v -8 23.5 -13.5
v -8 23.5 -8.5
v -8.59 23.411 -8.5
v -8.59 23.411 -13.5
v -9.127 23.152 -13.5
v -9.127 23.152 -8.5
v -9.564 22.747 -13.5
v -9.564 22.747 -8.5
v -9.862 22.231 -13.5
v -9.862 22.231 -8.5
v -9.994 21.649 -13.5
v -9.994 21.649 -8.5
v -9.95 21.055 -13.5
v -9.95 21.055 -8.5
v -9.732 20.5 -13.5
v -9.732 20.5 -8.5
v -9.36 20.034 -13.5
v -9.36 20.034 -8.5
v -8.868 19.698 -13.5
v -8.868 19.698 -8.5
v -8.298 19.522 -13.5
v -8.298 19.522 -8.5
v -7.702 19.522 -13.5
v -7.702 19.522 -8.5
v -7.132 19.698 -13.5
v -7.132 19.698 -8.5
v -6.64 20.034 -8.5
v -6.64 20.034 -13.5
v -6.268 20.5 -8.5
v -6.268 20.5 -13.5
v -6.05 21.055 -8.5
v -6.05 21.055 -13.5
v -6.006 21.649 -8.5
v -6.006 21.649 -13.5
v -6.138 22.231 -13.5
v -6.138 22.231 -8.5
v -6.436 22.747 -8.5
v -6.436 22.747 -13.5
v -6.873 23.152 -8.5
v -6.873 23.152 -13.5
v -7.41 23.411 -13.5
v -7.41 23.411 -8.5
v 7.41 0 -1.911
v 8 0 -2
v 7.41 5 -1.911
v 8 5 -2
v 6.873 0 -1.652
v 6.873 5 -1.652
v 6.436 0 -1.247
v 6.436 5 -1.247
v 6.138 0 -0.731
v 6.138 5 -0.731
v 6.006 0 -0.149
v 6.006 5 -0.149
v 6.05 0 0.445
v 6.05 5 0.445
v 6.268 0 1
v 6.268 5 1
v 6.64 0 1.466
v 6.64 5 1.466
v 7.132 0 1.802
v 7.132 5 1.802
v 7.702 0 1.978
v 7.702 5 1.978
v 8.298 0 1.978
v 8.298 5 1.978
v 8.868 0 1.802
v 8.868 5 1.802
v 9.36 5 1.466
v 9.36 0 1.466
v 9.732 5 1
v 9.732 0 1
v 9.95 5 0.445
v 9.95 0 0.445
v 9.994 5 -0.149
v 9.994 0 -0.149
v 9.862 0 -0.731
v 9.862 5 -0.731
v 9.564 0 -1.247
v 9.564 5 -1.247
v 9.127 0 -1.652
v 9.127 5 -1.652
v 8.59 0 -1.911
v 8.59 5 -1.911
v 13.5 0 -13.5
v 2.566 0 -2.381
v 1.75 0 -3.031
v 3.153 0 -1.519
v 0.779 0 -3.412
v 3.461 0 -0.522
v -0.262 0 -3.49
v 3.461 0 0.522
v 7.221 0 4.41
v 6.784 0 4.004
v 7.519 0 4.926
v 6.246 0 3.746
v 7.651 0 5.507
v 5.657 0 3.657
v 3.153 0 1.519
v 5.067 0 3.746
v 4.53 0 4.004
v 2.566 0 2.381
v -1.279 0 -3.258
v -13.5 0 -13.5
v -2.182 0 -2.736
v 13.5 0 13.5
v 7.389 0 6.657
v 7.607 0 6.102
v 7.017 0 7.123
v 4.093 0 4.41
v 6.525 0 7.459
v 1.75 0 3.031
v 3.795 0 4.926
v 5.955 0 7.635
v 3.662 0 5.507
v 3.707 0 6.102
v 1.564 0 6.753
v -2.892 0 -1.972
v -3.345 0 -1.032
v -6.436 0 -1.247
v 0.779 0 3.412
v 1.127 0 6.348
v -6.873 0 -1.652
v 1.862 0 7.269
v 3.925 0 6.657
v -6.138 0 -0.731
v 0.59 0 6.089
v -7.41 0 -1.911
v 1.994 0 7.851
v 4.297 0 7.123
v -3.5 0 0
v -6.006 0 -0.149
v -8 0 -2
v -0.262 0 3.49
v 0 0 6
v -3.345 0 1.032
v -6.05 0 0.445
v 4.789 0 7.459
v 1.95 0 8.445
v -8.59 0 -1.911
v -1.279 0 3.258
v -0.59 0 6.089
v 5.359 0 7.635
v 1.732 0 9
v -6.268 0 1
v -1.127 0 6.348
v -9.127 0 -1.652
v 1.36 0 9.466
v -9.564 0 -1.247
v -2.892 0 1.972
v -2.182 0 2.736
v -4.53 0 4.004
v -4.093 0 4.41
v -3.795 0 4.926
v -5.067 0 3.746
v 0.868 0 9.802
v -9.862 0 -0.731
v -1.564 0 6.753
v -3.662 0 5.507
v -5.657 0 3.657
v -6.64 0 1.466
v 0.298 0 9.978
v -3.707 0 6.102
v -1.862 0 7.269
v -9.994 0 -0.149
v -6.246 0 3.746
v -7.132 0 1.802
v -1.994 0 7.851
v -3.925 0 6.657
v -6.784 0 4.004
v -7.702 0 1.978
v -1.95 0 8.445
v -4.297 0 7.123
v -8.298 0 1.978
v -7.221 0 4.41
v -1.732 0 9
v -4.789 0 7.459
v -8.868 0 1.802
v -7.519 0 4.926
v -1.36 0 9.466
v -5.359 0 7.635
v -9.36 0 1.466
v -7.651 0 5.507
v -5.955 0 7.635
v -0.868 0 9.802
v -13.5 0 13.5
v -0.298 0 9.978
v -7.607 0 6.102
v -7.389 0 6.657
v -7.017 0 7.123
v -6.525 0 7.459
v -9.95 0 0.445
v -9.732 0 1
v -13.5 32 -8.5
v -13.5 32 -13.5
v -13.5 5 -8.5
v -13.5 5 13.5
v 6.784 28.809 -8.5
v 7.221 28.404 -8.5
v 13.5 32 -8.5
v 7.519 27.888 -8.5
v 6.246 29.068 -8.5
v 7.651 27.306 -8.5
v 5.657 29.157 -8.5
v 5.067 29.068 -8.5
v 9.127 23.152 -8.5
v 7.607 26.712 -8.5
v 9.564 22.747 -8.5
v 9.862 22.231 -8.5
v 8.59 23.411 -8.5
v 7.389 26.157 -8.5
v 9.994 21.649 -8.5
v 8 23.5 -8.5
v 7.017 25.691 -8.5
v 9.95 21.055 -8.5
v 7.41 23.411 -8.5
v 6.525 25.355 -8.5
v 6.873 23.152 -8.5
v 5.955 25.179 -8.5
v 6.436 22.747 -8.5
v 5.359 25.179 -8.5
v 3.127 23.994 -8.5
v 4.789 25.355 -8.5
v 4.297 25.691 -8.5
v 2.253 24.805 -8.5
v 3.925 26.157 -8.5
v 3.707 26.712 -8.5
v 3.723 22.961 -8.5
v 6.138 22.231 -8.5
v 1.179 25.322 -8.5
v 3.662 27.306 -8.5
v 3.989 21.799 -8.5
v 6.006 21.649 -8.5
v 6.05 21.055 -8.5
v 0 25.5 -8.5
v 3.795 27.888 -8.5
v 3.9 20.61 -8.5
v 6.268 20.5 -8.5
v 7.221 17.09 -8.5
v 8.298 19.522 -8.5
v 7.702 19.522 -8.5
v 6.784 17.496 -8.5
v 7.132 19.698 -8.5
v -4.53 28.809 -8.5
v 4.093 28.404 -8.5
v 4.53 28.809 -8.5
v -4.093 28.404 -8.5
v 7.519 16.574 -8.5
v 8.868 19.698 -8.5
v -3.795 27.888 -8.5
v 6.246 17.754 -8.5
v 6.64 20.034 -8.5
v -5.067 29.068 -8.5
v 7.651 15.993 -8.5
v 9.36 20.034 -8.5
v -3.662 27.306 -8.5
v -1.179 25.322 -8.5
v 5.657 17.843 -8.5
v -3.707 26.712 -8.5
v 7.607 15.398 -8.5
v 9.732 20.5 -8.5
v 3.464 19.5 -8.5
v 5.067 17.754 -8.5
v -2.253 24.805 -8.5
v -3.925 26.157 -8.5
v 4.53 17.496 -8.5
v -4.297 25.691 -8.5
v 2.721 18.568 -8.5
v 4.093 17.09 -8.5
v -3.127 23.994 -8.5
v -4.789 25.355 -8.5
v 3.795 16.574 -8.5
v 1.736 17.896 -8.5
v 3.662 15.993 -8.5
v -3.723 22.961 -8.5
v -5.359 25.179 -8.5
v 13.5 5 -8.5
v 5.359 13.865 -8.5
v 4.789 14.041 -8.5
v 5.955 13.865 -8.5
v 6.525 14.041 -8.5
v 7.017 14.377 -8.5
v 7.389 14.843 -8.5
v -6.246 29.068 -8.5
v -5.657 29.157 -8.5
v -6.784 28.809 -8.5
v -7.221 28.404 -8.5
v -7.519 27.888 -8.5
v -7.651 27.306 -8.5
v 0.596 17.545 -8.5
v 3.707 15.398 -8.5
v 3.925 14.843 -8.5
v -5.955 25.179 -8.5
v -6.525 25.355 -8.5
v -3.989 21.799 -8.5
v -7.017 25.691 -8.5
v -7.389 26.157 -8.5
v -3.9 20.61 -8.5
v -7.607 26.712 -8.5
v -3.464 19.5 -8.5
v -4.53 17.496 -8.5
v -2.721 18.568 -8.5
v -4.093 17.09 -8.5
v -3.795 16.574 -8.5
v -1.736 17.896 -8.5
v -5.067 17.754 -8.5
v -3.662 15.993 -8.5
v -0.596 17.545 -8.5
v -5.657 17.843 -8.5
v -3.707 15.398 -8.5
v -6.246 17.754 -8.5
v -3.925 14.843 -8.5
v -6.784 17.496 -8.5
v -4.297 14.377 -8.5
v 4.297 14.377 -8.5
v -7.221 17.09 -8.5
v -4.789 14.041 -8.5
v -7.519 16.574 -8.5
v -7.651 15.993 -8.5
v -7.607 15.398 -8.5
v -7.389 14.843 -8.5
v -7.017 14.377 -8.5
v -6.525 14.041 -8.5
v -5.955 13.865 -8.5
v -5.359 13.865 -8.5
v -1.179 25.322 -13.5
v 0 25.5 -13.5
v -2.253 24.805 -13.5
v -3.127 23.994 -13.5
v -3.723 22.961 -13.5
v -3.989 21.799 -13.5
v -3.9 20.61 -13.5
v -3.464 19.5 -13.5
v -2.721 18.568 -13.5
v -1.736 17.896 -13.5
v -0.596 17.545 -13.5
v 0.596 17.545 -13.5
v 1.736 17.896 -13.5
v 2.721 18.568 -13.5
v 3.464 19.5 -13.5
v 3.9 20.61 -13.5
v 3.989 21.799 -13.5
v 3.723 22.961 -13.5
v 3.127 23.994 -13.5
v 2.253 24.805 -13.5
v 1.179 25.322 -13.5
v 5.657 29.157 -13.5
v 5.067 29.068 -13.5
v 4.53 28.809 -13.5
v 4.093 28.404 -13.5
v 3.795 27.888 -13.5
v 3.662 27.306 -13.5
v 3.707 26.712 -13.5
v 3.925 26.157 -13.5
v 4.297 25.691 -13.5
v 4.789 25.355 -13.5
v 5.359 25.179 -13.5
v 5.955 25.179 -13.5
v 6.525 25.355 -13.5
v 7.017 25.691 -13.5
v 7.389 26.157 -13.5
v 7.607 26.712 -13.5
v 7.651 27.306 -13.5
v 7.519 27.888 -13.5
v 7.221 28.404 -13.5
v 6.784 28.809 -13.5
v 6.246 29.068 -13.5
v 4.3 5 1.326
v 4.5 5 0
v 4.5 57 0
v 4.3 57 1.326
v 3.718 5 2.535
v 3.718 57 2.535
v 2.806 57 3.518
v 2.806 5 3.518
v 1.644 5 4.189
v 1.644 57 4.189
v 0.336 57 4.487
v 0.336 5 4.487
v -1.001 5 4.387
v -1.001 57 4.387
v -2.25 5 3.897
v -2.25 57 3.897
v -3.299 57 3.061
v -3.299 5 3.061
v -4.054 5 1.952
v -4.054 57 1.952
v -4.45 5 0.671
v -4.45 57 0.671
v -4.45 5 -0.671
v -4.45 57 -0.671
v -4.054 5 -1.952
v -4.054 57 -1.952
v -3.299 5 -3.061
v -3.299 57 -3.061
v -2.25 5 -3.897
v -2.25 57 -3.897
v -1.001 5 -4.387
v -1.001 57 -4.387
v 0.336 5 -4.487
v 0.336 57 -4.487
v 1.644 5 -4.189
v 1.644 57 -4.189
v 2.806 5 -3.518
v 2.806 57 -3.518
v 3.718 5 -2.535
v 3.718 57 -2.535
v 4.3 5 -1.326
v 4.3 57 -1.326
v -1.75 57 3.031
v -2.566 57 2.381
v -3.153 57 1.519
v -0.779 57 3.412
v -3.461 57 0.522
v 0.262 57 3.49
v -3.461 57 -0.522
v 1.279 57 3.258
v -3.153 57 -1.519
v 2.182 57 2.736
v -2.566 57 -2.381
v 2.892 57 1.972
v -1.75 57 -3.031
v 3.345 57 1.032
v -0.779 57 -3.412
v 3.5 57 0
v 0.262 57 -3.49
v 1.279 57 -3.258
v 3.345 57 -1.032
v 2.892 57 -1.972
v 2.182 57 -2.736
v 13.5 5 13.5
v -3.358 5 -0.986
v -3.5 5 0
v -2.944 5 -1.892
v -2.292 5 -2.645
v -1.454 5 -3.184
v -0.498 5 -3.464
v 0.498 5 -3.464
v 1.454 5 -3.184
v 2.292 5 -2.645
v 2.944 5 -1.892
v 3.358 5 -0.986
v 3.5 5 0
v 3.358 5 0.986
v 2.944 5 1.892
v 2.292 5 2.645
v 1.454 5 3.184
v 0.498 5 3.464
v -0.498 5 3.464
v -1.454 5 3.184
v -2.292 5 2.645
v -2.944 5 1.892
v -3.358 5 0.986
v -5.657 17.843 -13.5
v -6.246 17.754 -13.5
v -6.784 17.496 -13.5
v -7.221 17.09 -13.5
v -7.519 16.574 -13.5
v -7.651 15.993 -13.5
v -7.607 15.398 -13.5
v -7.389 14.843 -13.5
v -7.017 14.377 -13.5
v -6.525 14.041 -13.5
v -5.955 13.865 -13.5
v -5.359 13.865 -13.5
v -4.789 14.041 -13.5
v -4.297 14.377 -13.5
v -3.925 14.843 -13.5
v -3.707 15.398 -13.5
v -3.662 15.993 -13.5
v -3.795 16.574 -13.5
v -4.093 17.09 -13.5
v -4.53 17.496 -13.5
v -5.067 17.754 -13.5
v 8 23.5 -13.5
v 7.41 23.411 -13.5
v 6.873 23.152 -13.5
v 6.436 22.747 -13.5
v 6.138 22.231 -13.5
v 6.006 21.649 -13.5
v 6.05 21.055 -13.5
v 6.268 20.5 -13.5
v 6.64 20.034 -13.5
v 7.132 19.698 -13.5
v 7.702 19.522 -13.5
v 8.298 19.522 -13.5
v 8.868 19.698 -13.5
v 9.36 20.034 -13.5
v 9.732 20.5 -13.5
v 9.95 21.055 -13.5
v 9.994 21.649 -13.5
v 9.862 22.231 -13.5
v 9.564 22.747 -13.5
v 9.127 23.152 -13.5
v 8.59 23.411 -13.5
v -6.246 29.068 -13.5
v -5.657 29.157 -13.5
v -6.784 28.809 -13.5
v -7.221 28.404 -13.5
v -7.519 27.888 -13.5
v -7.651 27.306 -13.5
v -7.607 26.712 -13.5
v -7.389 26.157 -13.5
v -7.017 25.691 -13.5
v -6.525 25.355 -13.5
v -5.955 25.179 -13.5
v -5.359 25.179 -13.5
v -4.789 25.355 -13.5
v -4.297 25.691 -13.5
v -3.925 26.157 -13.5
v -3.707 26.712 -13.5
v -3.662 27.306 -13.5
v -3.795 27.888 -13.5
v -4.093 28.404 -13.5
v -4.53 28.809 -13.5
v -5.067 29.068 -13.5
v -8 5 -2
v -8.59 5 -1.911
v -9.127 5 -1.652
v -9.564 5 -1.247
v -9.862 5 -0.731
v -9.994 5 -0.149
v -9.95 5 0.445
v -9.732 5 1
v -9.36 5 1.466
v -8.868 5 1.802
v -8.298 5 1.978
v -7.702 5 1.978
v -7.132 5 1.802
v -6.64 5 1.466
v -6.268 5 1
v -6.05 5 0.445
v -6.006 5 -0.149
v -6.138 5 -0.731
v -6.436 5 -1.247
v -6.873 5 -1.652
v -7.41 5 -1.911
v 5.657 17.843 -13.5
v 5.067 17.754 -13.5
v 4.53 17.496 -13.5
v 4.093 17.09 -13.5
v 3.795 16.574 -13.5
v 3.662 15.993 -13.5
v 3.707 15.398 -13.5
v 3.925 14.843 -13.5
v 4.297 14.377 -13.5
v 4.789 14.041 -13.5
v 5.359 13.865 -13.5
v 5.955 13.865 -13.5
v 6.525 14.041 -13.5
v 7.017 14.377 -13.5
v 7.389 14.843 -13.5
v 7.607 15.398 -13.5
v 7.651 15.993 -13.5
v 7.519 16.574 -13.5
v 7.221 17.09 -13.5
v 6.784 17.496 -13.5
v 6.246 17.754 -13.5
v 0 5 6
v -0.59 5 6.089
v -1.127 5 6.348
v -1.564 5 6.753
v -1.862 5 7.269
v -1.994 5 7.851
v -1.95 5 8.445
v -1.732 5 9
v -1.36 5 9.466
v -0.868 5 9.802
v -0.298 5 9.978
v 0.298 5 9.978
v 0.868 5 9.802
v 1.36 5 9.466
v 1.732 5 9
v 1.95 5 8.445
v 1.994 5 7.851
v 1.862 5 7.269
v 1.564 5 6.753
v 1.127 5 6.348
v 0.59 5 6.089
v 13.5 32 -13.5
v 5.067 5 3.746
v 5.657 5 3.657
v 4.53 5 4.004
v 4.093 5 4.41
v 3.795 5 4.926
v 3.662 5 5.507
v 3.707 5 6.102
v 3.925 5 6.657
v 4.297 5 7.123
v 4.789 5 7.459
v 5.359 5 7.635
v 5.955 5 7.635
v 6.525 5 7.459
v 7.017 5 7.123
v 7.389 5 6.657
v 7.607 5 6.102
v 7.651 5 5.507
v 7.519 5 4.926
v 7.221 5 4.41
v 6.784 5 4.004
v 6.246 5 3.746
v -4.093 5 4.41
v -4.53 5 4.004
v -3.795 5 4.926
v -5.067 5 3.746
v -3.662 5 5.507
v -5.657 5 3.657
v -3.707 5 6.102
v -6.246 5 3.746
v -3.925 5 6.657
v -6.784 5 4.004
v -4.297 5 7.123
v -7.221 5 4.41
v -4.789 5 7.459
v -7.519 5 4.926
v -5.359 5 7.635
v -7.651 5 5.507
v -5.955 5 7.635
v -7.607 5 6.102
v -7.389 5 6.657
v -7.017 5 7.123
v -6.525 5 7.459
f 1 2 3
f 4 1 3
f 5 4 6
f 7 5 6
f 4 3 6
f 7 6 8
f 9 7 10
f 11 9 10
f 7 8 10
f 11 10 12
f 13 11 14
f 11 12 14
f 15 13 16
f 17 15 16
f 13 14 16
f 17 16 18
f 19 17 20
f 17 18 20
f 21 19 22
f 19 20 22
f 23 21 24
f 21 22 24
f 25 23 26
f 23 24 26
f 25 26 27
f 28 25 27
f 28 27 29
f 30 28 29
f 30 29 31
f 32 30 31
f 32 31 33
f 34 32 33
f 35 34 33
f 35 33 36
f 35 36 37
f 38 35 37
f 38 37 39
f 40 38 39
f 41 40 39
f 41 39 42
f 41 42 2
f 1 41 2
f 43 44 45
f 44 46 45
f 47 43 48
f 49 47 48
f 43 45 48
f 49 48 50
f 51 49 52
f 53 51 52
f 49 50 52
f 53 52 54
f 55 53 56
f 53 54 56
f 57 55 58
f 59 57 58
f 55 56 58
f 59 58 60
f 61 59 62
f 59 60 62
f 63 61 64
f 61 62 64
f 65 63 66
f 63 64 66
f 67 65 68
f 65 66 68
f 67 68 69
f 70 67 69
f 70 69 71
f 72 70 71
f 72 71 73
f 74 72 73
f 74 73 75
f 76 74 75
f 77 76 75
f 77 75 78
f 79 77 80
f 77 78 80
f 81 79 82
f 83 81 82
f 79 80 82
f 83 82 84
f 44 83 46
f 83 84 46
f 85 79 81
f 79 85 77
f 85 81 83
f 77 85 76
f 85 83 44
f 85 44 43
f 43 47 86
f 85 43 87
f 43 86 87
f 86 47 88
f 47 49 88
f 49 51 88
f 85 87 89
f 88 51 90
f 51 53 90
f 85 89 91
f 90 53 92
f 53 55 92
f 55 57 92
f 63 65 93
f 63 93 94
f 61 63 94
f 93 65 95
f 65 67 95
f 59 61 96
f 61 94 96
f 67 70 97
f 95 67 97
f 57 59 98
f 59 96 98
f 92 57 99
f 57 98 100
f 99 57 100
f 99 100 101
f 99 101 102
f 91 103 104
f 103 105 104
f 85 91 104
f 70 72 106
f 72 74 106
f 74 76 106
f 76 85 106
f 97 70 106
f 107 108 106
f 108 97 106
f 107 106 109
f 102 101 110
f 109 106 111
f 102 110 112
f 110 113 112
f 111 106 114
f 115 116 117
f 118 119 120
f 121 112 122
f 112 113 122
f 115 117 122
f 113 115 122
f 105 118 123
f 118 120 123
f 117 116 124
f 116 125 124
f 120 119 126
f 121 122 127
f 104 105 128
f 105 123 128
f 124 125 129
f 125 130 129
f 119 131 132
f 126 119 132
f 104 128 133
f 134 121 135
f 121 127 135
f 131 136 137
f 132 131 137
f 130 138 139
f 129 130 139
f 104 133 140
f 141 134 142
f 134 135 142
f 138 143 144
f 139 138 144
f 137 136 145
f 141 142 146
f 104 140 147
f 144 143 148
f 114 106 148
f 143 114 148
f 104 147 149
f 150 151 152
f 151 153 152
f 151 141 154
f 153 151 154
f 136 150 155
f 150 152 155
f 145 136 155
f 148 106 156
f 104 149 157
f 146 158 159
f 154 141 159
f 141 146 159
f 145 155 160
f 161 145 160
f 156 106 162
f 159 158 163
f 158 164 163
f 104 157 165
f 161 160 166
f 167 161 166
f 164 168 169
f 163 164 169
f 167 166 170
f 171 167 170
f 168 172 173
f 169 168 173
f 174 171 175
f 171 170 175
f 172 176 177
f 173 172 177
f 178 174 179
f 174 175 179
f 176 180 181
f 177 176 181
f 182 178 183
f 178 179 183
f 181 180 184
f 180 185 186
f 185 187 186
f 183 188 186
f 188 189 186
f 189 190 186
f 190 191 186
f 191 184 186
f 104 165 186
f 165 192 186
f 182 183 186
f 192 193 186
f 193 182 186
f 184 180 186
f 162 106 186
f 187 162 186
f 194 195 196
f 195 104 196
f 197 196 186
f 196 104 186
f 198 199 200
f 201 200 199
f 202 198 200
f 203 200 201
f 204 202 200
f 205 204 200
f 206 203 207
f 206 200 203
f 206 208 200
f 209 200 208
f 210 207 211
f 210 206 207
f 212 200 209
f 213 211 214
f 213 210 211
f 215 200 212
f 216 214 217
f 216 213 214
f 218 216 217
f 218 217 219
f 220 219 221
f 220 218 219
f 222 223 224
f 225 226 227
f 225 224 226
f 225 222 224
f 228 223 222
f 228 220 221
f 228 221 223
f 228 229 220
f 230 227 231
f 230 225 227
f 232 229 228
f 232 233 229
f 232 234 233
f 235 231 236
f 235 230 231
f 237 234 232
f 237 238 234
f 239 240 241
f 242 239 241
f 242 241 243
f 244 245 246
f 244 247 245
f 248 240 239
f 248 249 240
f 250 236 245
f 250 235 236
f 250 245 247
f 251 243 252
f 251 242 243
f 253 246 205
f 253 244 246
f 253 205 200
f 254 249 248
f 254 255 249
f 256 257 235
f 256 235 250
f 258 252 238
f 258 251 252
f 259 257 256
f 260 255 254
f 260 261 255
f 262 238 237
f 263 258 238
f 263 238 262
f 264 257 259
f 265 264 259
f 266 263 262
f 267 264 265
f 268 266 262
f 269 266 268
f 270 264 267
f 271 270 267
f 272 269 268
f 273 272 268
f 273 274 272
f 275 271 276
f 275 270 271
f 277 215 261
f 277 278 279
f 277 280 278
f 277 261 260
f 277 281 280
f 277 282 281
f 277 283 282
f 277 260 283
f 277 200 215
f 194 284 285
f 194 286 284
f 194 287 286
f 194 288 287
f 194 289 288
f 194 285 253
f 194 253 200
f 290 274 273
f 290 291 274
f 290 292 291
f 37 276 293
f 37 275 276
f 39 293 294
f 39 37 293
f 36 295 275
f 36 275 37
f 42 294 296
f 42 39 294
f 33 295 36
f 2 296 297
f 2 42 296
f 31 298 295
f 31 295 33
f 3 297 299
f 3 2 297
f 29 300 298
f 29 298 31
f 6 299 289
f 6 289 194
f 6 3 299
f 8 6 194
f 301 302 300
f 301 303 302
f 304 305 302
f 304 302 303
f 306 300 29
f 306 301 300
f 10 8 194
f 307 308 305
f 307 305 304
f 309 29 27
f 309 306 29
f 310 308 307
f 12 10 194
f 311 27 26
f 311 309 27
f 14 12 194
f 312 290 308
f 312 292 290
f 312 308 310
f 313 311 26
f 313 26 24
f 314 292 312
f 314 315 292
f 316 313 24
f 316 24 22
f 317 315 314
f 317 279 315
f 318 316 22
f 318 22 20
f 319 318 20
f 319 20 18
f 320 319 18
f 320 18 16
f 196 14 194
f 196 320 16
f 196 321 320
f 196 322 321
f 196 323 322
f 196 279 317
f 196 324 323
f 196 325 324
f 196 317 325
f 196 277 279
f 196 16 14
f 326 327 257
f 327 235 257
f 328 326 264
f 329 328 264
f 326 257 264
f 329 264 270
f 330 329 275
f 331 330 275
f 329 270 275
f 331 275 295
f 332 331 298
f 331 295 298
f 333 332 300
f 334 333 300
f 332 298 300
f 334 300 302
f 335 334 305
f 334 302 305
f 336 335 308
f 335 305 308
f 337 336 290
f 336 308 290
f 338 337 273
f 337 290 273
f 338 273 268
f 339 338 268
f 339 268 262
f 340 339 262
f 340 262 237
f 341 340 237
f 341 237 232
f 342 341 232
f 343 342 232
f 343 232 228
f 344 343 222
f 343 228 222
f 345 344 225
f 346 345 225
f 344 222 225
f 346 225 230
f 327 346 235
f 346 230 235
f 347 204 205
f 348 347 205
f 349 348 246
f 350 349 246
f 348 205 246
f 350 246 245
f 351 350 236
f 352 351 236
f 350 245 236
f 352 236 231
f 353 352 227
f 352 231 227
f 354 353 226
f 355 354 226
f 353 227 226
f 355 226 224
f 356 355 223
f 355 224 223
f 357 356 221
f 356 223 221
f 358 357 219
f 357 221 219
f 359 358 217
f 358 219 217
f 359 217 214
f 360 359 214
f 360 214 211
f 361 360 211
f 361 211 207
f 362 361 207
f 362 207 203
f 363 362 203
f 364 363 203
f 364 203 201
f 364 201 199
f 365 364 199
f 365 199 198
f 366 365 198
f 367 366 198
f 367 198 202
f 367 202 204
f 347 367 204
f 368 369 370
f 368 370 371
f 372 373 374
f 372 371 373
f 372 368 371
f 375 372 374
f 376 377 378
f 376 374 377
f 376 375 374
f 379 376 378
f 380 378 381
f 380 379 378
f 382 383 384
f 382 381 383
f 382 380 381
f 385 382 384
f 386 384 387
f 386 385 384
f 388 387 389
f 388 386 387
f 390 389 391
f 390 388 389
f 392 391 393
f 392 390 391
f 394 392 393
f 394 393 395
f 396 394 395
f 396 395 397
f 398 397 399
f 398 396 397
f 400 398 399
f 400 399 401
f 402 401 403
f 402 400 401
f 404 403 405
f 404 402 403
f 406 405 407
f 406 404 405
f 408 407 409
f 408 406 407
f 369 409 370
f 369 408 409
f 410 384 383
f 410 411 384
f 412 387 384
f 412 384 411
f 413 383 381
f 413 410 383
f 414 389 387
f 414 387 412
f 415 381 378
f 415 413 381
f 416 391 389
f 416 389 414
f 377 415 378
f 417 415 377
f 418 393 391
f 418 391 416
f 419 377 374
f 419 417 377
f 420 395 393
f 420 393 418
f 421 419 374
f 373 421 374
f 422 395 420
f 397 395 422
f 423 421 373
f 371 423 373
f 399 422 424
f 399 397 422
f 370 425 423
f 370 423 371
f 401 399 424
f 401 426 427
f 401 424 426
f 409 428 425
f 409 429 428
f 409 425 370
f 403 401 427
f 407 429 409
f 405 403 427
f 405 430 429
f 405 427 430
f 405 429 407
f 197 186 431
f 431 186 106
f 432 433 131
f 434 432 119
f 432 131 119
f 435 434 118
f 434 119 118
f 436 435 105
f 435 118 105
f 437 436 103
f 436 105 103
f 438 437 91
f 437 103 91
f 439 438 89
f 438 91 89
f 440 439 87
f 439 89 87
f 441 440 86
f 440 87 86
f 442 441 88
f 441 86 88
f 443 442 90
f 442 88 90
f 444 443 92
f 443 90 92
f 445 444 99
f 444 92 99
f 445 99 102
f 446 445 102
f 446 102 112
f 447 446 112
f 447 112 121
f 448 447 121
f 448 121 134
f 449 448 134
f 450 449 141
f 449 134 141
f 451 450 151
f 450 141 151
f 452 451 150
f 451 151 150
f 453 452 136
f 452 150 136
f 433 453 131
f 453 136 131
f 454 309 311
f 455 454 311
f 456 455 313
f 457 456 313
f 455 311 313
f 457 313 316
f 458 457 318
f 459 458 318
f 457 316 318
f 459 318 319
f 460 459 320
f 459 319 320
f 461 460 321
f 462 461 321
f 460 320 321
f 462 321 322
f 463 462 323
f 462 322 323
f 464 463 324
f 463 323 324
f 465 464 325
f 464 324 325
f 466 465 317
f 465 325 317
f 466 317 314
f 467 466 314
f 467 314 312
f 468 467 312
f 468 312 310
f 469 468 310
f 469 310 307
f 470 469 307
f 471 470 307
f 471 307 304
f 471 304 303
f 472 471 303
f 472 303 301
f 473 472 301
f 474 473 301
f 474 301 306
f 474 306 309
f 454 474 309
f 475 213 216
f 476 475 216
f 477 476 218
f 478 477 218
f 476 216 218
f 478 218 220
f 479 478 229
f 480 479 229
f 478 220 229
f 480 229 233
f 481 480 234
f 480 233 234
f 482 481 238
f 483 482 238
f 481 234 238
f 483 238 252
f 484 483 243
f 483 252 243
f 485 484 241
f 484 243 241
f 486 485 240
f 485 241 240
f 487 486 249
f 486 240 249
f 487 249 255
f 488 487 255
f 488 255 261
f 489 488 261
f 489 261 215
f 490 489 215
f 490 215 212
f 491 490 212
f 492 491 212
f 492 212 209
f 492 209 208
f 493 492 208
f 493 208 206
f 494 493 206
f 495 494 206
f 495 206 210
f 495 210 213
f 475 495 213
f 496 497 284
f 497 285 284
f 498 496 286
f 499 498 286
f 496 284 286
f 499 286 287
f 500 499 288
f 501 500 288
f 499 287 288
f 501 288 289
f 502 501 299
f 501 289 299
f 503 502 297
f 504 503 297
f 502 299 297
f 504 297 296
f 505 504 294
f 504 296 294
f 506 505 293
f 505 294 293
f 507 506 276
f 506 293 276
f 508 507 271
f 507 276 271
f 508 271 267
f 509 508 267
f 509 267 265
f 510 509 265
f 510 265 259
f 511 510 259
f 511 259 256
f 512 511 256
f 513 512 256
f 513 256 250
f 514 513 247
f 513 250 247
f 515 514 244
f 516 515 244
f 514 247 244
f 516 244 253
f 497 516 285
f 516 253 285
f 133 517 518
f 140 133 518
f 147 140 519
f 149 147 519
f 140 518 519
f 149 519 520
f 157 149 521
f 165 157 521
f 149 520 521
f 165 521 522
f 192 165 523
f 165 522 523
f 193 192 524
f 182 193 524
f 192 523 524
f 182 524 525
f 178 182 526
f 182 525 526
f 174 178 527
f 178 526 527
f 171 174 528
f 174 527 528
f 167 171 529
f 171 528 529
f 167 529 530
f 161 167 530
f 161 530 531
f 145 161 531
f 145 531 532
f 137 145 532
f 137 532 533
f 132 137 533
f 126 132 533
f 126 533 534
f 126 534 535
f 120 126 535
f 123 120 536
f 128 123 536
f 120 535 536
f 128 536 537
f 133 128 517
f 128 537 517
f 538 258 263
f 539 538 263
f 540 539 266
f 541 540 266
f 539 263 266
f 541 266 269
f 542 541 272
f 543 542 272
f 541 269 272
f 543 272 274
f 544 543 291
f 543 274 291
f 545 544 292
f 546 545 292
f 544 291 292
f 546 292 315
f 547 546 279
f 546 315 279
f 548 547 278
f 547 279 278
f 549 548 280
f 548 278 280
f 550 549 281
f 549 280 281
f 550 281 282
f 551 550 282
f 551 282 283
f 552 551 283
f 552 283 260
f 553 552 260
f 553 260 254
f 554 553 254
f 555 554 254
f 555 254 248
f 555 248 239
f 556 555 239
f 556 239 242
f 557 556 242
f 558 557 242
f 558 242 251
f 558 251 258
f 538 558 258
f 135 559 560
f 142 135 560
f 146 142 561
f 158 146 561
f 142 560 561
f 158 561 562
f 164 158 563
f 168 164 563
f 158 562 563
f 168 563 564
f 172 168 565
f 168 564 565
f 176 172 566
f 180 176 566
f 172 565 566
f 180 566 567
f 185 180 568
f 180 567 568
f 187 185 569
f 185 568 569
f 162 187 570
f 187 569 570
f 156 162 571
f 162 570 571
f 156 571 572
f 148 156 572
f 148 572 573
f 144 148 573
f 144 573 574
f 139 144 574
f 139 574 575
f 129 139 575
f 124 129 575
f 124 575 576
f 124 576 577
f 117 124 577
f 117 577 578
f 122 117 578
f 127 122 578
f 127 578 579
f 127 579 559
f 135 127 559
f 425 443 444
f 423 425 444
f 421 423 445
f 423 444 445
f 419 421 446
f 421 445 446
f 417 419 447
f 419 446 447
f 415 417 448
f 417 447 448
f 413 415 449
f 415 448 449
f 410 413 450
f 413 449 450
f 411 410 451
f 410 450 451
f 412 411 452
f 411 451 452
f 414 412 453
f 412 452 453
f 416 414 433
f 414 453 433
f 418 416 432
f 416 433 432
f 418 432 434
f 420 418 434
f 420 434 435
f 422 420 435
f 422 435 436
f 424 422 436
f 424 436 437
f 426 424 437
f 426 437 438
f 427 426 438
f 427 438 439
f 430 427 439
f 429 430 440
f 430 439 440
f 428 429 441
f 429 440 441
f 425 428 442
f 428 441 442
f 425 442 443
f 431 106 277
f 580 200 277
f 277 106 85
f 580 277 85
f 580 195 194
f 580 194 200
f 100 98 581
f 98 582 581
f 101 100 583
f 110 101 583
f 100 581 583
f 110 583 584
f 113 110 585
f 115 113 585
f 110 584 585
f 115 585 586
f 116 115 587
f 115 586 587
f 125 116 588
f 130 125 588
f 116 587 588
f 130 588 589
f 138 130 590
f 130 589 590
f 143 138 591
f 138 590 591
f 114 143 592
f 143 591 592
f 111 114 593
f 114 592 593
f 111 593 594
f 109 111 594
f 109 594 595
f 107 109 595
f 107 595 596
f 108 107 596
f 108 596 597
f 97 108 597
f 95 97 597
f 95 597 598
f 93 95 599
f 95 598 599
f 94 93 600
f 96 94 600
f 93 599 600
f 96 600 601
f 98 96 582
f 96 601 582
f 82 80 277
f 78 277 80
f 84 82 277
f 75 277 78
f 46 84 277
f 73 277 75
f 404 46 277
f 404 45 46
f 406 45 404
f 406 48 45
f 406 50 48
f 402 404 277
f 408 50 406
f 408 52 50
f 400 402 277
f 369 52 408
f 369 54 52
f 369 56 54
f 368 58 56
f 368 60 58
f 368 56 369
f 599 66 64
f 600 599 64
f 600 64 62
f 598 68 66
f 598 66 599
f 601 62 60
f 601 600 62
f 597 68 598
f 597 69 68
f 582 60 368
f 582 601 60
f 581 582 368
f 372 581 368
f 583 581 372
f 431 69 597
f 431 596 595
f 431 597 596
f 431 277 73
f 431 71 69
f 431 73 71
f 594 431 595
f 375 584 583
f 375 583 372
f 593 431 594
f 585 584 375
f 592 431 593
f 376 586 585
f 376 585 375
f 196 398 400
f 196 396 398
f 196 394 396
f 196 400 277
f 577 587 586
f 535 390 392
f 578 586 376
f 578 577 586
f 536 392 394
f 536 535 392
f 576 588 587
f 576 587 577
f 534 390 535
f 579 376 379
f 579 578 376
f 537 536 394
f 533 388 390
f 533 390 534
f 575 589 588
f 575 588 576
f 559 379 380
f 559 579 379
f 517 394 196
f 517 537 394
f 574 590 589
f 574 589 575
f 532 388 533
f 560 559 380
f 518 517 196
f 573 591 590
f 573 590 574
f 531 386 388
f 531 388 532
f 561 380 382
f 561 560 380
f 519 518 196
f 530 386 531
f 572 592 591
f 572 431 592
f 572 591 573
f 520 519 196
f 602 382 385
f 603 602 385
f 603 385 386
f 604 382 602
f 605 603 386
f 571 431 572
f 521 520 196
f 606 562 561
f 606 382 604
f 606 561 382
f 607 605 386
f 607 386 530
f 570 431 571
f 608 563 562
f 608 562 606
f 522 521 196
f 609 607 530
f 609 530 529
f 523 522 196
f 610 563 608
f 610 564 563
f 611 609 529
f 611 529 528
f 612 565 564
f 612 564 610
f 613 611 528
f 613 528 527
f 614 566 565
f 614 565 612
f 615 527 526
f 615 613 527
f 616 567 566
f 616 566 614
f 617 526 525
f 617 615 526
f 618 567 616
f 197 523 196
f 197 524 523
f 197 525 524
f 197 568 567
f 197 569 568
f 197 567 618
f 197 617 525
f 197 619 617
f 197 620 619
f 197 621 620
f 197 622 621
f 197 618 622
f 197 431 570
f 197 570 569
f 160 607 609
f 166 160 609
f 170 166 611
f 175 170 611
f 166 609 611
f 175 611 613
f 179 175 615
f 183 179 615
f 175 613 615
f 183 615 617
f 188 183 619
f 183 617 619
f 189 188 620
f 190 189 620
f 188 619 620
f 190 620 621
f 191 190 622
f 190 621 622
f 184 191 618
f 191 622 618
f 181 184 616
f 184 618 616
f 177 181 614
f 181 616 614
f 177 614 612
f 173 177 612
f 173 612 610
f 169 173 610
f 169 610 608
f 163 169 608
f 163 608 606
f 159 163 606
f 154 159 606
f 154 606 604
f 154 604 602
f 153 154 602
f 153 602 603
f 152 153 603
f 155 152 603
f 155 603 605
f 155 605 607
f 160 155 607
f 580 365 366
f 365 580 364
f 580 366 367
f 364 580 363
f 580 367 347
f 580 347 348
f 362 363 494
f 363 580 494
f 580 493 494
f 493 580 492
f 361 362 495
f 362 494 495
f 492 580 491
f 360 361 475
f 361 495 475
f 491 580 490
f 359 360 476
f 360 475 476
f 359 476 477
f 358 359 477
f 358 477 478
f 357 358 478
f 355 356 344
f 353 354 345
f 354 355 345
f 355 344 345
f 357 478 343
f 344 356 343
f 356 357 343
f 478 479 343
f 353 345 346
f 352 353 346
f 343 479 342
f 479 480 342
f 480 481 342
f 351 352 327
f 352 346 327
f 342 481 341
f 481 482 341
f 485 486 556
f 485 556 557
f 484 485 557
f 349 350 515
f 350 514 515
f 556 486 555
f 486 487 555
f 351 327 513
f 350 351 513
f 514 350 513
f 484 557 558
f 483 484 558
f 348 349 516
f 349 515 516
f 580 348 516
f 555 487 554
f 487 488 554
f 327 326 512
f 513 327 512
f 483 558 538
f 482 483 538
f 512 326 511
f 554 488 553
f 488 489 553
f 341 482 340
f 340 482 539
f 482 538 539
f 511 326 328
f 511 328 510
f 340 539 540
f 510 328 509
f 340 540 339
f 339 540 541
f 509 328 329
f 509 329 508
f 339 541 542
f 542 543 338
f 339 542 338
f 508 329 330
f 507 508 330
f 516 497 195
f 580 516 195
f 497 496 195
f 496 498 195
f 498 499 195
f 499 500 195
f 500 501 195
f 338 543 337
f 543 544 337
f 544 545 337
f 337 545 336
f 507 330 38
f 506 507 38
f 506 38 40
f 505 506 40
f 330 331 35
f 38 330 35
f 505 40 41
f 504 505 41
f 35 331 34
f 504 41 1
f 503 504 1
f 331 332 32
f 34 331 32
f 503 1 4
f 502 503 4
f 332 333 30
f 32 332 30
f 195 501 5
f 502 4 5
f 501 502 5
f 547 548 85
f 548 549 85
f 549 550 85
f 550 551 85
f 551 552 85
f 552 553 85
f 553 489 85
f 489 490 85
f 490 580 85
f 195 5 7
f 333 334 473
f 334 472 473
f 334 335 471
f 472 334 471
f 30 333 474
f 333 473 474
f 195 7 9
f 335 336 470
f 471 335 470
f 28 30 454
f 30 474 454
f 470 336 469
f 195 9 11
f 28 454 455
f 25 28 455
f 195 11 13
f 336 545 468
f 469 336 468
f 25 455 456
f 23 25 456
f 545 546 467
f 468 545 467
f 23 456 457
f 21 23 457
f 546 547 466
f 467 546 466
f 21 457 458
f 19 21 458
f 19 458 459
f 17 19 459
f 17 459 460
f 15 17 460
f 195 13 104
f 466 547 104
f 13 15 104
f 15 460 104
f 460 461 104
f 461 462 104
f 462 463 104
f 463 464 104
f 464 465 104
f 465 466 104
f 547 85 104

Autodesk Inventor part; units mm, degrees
ref_plane "YZ Plane" through (0, 0, 0) normal (1, 0, 0) x (0, 1, 0)
ref_plane "XZ Plane" through (0, 0, 0) normal (0, 1, 0) x (-1, 0, 0)
ref_plane "XY Plane" through (0, 0, 0) normal (0, 0, 1) x (1, 0, 0)
sketch "Sketch1" plane through (0, 0, 0) normal (0, 1, 0) x (-1, 0, 0)
  line L0 (-13.5, -13.5) -> (13.5, -13.5)
  line L1 (13.5, -13.5) -> (13.5, 13.5)
  line L2 (13.5, 13.5) -> (-13.5, 13.5)
  line L3 (-13.5, 13.5) -> (-13.5, -13.5)
  line L4 (-13.5, -13.5) -> (13.5, 13.5) construction
  line L5 (13.5, -13.5) -> (-13.5, 13.5) construction
  circle A0 centre (0, 0) radius 3.5
  dimension "d0" = 27
  dimension "d1" = 27
  dimension "d5" = 7
extrude "Extrusion2" add sketch "Sketch1" along normal blind 5
sketch "Sketch4" plane through (0, 5, 0) normal (0, 1, 0) x (1, 0, 0)
  line L0 (-13.5, 13.5) -> (-13.5, -13.5) projected
  line L1 (-13.5, 13.5) -> (13.5, 13.5)
  line L2 (13.5, 13.5) -> (13.5, 8.5)
  line L3 (13.5, 8.5) -> (-13.5, 8.5)
  line L4 (-13.5, 8.5) -> (-13.5, 13.5)
  point P0 (0, 0)
  dimension "d11" = 27
  dimension "d12" = 5
extrude "Extrusion4" add sketch "Sketch4" along normal blind 27
sketch "Sketch5" plane through (13.5, 0, -13.5) normal (0, 0, -1) x (-1, 0, 0)
  line L0 (27, 5) -> (27, 32) projected
  line L1 (0, 32) -> (27, 32)
  line L2 (27, 32) -> (27, 5)
  line L3 (27, 5) -> (0, 5)
  line L4 (0, 5) -> (0, 32)
  circle A0 centre (13.5, 21.5) radius 4
  point P0 (13.5, 0)
  dimension "d15" = 27
  dimension "d16" = 27
  dimension "d17" = 8
hole "Hole1" at (0, 21.5, -13.5) direction (0, 0, 1) diameter 8 depth 5 tip angle 118
sketch "Sketch7" plane through (0, 0, 0) normal (0, -1, 0) x (1, 0, 0)
  circle A0 centre (8, 0) radius 1.85 projected
  circle A1 centre (5.6569, 5.6569) radius 1.85 projected
  circle A2 centre (0, 8) radius 1.85 projected
  circle A3 centre (-5.6569, 5.6569) radius 1.85 projected
  circle A4 centre (-8, 0) radius 1.85 projected
  point P0 (0, 0)
hole "Hole2" at (8, 0, 0) at (5.6569, 0, 5.6569) at (0, 0, 8) at (-5.6569, 0, 5.6569) at (-8, 0, 0) direction (0, 1, 0) diameter 4 end through all
sketch "Sketch9" plane through (0, 5, 0) normal (0, 1, 0) x (1, 0, 0)
  circle A0 centre (0, 0) radius 4.5
  circle A1 centre (0, 0) radius 3.5 projected
  dimension "d33" = 9
extrude "Extrusion5" add sketch "Sketch9" along normal blind 52
sketch "Sketch10" plane through (13.5, 0, -13.5) normal (0, 0, -1) x (-1, 0, 0)
  circle A0 centre (21.5, 21.5) radius 1.85
  circle A1 centre (5.5, 21.5) radius 1.85
  circle A2 centre (19.1569, 27.1569) radius 1.85
  circle A3 centre (19.1569, 15.8431) radius 1.85
  circle A4 centre (7.8431, 15.8431) radius 1.85
  circle A5 centre (7.8431, 27.1569) radius 1.85
  point P0 (13.5, 0)
hole "Hole3" at (5.6569, 15.8431, -13.5) at (8, 21.5, -13.5) at (5.6569, 27.1569, -13.5) at (-5.6569, 27.1569, -13.5) at (-8, 21.5, -13.5) at (-5.6569, 15.8431, -13.5) direction (0, 0, 1) diameter 4 depth 5 tip angle 118
properties part number "Flag Mount"
